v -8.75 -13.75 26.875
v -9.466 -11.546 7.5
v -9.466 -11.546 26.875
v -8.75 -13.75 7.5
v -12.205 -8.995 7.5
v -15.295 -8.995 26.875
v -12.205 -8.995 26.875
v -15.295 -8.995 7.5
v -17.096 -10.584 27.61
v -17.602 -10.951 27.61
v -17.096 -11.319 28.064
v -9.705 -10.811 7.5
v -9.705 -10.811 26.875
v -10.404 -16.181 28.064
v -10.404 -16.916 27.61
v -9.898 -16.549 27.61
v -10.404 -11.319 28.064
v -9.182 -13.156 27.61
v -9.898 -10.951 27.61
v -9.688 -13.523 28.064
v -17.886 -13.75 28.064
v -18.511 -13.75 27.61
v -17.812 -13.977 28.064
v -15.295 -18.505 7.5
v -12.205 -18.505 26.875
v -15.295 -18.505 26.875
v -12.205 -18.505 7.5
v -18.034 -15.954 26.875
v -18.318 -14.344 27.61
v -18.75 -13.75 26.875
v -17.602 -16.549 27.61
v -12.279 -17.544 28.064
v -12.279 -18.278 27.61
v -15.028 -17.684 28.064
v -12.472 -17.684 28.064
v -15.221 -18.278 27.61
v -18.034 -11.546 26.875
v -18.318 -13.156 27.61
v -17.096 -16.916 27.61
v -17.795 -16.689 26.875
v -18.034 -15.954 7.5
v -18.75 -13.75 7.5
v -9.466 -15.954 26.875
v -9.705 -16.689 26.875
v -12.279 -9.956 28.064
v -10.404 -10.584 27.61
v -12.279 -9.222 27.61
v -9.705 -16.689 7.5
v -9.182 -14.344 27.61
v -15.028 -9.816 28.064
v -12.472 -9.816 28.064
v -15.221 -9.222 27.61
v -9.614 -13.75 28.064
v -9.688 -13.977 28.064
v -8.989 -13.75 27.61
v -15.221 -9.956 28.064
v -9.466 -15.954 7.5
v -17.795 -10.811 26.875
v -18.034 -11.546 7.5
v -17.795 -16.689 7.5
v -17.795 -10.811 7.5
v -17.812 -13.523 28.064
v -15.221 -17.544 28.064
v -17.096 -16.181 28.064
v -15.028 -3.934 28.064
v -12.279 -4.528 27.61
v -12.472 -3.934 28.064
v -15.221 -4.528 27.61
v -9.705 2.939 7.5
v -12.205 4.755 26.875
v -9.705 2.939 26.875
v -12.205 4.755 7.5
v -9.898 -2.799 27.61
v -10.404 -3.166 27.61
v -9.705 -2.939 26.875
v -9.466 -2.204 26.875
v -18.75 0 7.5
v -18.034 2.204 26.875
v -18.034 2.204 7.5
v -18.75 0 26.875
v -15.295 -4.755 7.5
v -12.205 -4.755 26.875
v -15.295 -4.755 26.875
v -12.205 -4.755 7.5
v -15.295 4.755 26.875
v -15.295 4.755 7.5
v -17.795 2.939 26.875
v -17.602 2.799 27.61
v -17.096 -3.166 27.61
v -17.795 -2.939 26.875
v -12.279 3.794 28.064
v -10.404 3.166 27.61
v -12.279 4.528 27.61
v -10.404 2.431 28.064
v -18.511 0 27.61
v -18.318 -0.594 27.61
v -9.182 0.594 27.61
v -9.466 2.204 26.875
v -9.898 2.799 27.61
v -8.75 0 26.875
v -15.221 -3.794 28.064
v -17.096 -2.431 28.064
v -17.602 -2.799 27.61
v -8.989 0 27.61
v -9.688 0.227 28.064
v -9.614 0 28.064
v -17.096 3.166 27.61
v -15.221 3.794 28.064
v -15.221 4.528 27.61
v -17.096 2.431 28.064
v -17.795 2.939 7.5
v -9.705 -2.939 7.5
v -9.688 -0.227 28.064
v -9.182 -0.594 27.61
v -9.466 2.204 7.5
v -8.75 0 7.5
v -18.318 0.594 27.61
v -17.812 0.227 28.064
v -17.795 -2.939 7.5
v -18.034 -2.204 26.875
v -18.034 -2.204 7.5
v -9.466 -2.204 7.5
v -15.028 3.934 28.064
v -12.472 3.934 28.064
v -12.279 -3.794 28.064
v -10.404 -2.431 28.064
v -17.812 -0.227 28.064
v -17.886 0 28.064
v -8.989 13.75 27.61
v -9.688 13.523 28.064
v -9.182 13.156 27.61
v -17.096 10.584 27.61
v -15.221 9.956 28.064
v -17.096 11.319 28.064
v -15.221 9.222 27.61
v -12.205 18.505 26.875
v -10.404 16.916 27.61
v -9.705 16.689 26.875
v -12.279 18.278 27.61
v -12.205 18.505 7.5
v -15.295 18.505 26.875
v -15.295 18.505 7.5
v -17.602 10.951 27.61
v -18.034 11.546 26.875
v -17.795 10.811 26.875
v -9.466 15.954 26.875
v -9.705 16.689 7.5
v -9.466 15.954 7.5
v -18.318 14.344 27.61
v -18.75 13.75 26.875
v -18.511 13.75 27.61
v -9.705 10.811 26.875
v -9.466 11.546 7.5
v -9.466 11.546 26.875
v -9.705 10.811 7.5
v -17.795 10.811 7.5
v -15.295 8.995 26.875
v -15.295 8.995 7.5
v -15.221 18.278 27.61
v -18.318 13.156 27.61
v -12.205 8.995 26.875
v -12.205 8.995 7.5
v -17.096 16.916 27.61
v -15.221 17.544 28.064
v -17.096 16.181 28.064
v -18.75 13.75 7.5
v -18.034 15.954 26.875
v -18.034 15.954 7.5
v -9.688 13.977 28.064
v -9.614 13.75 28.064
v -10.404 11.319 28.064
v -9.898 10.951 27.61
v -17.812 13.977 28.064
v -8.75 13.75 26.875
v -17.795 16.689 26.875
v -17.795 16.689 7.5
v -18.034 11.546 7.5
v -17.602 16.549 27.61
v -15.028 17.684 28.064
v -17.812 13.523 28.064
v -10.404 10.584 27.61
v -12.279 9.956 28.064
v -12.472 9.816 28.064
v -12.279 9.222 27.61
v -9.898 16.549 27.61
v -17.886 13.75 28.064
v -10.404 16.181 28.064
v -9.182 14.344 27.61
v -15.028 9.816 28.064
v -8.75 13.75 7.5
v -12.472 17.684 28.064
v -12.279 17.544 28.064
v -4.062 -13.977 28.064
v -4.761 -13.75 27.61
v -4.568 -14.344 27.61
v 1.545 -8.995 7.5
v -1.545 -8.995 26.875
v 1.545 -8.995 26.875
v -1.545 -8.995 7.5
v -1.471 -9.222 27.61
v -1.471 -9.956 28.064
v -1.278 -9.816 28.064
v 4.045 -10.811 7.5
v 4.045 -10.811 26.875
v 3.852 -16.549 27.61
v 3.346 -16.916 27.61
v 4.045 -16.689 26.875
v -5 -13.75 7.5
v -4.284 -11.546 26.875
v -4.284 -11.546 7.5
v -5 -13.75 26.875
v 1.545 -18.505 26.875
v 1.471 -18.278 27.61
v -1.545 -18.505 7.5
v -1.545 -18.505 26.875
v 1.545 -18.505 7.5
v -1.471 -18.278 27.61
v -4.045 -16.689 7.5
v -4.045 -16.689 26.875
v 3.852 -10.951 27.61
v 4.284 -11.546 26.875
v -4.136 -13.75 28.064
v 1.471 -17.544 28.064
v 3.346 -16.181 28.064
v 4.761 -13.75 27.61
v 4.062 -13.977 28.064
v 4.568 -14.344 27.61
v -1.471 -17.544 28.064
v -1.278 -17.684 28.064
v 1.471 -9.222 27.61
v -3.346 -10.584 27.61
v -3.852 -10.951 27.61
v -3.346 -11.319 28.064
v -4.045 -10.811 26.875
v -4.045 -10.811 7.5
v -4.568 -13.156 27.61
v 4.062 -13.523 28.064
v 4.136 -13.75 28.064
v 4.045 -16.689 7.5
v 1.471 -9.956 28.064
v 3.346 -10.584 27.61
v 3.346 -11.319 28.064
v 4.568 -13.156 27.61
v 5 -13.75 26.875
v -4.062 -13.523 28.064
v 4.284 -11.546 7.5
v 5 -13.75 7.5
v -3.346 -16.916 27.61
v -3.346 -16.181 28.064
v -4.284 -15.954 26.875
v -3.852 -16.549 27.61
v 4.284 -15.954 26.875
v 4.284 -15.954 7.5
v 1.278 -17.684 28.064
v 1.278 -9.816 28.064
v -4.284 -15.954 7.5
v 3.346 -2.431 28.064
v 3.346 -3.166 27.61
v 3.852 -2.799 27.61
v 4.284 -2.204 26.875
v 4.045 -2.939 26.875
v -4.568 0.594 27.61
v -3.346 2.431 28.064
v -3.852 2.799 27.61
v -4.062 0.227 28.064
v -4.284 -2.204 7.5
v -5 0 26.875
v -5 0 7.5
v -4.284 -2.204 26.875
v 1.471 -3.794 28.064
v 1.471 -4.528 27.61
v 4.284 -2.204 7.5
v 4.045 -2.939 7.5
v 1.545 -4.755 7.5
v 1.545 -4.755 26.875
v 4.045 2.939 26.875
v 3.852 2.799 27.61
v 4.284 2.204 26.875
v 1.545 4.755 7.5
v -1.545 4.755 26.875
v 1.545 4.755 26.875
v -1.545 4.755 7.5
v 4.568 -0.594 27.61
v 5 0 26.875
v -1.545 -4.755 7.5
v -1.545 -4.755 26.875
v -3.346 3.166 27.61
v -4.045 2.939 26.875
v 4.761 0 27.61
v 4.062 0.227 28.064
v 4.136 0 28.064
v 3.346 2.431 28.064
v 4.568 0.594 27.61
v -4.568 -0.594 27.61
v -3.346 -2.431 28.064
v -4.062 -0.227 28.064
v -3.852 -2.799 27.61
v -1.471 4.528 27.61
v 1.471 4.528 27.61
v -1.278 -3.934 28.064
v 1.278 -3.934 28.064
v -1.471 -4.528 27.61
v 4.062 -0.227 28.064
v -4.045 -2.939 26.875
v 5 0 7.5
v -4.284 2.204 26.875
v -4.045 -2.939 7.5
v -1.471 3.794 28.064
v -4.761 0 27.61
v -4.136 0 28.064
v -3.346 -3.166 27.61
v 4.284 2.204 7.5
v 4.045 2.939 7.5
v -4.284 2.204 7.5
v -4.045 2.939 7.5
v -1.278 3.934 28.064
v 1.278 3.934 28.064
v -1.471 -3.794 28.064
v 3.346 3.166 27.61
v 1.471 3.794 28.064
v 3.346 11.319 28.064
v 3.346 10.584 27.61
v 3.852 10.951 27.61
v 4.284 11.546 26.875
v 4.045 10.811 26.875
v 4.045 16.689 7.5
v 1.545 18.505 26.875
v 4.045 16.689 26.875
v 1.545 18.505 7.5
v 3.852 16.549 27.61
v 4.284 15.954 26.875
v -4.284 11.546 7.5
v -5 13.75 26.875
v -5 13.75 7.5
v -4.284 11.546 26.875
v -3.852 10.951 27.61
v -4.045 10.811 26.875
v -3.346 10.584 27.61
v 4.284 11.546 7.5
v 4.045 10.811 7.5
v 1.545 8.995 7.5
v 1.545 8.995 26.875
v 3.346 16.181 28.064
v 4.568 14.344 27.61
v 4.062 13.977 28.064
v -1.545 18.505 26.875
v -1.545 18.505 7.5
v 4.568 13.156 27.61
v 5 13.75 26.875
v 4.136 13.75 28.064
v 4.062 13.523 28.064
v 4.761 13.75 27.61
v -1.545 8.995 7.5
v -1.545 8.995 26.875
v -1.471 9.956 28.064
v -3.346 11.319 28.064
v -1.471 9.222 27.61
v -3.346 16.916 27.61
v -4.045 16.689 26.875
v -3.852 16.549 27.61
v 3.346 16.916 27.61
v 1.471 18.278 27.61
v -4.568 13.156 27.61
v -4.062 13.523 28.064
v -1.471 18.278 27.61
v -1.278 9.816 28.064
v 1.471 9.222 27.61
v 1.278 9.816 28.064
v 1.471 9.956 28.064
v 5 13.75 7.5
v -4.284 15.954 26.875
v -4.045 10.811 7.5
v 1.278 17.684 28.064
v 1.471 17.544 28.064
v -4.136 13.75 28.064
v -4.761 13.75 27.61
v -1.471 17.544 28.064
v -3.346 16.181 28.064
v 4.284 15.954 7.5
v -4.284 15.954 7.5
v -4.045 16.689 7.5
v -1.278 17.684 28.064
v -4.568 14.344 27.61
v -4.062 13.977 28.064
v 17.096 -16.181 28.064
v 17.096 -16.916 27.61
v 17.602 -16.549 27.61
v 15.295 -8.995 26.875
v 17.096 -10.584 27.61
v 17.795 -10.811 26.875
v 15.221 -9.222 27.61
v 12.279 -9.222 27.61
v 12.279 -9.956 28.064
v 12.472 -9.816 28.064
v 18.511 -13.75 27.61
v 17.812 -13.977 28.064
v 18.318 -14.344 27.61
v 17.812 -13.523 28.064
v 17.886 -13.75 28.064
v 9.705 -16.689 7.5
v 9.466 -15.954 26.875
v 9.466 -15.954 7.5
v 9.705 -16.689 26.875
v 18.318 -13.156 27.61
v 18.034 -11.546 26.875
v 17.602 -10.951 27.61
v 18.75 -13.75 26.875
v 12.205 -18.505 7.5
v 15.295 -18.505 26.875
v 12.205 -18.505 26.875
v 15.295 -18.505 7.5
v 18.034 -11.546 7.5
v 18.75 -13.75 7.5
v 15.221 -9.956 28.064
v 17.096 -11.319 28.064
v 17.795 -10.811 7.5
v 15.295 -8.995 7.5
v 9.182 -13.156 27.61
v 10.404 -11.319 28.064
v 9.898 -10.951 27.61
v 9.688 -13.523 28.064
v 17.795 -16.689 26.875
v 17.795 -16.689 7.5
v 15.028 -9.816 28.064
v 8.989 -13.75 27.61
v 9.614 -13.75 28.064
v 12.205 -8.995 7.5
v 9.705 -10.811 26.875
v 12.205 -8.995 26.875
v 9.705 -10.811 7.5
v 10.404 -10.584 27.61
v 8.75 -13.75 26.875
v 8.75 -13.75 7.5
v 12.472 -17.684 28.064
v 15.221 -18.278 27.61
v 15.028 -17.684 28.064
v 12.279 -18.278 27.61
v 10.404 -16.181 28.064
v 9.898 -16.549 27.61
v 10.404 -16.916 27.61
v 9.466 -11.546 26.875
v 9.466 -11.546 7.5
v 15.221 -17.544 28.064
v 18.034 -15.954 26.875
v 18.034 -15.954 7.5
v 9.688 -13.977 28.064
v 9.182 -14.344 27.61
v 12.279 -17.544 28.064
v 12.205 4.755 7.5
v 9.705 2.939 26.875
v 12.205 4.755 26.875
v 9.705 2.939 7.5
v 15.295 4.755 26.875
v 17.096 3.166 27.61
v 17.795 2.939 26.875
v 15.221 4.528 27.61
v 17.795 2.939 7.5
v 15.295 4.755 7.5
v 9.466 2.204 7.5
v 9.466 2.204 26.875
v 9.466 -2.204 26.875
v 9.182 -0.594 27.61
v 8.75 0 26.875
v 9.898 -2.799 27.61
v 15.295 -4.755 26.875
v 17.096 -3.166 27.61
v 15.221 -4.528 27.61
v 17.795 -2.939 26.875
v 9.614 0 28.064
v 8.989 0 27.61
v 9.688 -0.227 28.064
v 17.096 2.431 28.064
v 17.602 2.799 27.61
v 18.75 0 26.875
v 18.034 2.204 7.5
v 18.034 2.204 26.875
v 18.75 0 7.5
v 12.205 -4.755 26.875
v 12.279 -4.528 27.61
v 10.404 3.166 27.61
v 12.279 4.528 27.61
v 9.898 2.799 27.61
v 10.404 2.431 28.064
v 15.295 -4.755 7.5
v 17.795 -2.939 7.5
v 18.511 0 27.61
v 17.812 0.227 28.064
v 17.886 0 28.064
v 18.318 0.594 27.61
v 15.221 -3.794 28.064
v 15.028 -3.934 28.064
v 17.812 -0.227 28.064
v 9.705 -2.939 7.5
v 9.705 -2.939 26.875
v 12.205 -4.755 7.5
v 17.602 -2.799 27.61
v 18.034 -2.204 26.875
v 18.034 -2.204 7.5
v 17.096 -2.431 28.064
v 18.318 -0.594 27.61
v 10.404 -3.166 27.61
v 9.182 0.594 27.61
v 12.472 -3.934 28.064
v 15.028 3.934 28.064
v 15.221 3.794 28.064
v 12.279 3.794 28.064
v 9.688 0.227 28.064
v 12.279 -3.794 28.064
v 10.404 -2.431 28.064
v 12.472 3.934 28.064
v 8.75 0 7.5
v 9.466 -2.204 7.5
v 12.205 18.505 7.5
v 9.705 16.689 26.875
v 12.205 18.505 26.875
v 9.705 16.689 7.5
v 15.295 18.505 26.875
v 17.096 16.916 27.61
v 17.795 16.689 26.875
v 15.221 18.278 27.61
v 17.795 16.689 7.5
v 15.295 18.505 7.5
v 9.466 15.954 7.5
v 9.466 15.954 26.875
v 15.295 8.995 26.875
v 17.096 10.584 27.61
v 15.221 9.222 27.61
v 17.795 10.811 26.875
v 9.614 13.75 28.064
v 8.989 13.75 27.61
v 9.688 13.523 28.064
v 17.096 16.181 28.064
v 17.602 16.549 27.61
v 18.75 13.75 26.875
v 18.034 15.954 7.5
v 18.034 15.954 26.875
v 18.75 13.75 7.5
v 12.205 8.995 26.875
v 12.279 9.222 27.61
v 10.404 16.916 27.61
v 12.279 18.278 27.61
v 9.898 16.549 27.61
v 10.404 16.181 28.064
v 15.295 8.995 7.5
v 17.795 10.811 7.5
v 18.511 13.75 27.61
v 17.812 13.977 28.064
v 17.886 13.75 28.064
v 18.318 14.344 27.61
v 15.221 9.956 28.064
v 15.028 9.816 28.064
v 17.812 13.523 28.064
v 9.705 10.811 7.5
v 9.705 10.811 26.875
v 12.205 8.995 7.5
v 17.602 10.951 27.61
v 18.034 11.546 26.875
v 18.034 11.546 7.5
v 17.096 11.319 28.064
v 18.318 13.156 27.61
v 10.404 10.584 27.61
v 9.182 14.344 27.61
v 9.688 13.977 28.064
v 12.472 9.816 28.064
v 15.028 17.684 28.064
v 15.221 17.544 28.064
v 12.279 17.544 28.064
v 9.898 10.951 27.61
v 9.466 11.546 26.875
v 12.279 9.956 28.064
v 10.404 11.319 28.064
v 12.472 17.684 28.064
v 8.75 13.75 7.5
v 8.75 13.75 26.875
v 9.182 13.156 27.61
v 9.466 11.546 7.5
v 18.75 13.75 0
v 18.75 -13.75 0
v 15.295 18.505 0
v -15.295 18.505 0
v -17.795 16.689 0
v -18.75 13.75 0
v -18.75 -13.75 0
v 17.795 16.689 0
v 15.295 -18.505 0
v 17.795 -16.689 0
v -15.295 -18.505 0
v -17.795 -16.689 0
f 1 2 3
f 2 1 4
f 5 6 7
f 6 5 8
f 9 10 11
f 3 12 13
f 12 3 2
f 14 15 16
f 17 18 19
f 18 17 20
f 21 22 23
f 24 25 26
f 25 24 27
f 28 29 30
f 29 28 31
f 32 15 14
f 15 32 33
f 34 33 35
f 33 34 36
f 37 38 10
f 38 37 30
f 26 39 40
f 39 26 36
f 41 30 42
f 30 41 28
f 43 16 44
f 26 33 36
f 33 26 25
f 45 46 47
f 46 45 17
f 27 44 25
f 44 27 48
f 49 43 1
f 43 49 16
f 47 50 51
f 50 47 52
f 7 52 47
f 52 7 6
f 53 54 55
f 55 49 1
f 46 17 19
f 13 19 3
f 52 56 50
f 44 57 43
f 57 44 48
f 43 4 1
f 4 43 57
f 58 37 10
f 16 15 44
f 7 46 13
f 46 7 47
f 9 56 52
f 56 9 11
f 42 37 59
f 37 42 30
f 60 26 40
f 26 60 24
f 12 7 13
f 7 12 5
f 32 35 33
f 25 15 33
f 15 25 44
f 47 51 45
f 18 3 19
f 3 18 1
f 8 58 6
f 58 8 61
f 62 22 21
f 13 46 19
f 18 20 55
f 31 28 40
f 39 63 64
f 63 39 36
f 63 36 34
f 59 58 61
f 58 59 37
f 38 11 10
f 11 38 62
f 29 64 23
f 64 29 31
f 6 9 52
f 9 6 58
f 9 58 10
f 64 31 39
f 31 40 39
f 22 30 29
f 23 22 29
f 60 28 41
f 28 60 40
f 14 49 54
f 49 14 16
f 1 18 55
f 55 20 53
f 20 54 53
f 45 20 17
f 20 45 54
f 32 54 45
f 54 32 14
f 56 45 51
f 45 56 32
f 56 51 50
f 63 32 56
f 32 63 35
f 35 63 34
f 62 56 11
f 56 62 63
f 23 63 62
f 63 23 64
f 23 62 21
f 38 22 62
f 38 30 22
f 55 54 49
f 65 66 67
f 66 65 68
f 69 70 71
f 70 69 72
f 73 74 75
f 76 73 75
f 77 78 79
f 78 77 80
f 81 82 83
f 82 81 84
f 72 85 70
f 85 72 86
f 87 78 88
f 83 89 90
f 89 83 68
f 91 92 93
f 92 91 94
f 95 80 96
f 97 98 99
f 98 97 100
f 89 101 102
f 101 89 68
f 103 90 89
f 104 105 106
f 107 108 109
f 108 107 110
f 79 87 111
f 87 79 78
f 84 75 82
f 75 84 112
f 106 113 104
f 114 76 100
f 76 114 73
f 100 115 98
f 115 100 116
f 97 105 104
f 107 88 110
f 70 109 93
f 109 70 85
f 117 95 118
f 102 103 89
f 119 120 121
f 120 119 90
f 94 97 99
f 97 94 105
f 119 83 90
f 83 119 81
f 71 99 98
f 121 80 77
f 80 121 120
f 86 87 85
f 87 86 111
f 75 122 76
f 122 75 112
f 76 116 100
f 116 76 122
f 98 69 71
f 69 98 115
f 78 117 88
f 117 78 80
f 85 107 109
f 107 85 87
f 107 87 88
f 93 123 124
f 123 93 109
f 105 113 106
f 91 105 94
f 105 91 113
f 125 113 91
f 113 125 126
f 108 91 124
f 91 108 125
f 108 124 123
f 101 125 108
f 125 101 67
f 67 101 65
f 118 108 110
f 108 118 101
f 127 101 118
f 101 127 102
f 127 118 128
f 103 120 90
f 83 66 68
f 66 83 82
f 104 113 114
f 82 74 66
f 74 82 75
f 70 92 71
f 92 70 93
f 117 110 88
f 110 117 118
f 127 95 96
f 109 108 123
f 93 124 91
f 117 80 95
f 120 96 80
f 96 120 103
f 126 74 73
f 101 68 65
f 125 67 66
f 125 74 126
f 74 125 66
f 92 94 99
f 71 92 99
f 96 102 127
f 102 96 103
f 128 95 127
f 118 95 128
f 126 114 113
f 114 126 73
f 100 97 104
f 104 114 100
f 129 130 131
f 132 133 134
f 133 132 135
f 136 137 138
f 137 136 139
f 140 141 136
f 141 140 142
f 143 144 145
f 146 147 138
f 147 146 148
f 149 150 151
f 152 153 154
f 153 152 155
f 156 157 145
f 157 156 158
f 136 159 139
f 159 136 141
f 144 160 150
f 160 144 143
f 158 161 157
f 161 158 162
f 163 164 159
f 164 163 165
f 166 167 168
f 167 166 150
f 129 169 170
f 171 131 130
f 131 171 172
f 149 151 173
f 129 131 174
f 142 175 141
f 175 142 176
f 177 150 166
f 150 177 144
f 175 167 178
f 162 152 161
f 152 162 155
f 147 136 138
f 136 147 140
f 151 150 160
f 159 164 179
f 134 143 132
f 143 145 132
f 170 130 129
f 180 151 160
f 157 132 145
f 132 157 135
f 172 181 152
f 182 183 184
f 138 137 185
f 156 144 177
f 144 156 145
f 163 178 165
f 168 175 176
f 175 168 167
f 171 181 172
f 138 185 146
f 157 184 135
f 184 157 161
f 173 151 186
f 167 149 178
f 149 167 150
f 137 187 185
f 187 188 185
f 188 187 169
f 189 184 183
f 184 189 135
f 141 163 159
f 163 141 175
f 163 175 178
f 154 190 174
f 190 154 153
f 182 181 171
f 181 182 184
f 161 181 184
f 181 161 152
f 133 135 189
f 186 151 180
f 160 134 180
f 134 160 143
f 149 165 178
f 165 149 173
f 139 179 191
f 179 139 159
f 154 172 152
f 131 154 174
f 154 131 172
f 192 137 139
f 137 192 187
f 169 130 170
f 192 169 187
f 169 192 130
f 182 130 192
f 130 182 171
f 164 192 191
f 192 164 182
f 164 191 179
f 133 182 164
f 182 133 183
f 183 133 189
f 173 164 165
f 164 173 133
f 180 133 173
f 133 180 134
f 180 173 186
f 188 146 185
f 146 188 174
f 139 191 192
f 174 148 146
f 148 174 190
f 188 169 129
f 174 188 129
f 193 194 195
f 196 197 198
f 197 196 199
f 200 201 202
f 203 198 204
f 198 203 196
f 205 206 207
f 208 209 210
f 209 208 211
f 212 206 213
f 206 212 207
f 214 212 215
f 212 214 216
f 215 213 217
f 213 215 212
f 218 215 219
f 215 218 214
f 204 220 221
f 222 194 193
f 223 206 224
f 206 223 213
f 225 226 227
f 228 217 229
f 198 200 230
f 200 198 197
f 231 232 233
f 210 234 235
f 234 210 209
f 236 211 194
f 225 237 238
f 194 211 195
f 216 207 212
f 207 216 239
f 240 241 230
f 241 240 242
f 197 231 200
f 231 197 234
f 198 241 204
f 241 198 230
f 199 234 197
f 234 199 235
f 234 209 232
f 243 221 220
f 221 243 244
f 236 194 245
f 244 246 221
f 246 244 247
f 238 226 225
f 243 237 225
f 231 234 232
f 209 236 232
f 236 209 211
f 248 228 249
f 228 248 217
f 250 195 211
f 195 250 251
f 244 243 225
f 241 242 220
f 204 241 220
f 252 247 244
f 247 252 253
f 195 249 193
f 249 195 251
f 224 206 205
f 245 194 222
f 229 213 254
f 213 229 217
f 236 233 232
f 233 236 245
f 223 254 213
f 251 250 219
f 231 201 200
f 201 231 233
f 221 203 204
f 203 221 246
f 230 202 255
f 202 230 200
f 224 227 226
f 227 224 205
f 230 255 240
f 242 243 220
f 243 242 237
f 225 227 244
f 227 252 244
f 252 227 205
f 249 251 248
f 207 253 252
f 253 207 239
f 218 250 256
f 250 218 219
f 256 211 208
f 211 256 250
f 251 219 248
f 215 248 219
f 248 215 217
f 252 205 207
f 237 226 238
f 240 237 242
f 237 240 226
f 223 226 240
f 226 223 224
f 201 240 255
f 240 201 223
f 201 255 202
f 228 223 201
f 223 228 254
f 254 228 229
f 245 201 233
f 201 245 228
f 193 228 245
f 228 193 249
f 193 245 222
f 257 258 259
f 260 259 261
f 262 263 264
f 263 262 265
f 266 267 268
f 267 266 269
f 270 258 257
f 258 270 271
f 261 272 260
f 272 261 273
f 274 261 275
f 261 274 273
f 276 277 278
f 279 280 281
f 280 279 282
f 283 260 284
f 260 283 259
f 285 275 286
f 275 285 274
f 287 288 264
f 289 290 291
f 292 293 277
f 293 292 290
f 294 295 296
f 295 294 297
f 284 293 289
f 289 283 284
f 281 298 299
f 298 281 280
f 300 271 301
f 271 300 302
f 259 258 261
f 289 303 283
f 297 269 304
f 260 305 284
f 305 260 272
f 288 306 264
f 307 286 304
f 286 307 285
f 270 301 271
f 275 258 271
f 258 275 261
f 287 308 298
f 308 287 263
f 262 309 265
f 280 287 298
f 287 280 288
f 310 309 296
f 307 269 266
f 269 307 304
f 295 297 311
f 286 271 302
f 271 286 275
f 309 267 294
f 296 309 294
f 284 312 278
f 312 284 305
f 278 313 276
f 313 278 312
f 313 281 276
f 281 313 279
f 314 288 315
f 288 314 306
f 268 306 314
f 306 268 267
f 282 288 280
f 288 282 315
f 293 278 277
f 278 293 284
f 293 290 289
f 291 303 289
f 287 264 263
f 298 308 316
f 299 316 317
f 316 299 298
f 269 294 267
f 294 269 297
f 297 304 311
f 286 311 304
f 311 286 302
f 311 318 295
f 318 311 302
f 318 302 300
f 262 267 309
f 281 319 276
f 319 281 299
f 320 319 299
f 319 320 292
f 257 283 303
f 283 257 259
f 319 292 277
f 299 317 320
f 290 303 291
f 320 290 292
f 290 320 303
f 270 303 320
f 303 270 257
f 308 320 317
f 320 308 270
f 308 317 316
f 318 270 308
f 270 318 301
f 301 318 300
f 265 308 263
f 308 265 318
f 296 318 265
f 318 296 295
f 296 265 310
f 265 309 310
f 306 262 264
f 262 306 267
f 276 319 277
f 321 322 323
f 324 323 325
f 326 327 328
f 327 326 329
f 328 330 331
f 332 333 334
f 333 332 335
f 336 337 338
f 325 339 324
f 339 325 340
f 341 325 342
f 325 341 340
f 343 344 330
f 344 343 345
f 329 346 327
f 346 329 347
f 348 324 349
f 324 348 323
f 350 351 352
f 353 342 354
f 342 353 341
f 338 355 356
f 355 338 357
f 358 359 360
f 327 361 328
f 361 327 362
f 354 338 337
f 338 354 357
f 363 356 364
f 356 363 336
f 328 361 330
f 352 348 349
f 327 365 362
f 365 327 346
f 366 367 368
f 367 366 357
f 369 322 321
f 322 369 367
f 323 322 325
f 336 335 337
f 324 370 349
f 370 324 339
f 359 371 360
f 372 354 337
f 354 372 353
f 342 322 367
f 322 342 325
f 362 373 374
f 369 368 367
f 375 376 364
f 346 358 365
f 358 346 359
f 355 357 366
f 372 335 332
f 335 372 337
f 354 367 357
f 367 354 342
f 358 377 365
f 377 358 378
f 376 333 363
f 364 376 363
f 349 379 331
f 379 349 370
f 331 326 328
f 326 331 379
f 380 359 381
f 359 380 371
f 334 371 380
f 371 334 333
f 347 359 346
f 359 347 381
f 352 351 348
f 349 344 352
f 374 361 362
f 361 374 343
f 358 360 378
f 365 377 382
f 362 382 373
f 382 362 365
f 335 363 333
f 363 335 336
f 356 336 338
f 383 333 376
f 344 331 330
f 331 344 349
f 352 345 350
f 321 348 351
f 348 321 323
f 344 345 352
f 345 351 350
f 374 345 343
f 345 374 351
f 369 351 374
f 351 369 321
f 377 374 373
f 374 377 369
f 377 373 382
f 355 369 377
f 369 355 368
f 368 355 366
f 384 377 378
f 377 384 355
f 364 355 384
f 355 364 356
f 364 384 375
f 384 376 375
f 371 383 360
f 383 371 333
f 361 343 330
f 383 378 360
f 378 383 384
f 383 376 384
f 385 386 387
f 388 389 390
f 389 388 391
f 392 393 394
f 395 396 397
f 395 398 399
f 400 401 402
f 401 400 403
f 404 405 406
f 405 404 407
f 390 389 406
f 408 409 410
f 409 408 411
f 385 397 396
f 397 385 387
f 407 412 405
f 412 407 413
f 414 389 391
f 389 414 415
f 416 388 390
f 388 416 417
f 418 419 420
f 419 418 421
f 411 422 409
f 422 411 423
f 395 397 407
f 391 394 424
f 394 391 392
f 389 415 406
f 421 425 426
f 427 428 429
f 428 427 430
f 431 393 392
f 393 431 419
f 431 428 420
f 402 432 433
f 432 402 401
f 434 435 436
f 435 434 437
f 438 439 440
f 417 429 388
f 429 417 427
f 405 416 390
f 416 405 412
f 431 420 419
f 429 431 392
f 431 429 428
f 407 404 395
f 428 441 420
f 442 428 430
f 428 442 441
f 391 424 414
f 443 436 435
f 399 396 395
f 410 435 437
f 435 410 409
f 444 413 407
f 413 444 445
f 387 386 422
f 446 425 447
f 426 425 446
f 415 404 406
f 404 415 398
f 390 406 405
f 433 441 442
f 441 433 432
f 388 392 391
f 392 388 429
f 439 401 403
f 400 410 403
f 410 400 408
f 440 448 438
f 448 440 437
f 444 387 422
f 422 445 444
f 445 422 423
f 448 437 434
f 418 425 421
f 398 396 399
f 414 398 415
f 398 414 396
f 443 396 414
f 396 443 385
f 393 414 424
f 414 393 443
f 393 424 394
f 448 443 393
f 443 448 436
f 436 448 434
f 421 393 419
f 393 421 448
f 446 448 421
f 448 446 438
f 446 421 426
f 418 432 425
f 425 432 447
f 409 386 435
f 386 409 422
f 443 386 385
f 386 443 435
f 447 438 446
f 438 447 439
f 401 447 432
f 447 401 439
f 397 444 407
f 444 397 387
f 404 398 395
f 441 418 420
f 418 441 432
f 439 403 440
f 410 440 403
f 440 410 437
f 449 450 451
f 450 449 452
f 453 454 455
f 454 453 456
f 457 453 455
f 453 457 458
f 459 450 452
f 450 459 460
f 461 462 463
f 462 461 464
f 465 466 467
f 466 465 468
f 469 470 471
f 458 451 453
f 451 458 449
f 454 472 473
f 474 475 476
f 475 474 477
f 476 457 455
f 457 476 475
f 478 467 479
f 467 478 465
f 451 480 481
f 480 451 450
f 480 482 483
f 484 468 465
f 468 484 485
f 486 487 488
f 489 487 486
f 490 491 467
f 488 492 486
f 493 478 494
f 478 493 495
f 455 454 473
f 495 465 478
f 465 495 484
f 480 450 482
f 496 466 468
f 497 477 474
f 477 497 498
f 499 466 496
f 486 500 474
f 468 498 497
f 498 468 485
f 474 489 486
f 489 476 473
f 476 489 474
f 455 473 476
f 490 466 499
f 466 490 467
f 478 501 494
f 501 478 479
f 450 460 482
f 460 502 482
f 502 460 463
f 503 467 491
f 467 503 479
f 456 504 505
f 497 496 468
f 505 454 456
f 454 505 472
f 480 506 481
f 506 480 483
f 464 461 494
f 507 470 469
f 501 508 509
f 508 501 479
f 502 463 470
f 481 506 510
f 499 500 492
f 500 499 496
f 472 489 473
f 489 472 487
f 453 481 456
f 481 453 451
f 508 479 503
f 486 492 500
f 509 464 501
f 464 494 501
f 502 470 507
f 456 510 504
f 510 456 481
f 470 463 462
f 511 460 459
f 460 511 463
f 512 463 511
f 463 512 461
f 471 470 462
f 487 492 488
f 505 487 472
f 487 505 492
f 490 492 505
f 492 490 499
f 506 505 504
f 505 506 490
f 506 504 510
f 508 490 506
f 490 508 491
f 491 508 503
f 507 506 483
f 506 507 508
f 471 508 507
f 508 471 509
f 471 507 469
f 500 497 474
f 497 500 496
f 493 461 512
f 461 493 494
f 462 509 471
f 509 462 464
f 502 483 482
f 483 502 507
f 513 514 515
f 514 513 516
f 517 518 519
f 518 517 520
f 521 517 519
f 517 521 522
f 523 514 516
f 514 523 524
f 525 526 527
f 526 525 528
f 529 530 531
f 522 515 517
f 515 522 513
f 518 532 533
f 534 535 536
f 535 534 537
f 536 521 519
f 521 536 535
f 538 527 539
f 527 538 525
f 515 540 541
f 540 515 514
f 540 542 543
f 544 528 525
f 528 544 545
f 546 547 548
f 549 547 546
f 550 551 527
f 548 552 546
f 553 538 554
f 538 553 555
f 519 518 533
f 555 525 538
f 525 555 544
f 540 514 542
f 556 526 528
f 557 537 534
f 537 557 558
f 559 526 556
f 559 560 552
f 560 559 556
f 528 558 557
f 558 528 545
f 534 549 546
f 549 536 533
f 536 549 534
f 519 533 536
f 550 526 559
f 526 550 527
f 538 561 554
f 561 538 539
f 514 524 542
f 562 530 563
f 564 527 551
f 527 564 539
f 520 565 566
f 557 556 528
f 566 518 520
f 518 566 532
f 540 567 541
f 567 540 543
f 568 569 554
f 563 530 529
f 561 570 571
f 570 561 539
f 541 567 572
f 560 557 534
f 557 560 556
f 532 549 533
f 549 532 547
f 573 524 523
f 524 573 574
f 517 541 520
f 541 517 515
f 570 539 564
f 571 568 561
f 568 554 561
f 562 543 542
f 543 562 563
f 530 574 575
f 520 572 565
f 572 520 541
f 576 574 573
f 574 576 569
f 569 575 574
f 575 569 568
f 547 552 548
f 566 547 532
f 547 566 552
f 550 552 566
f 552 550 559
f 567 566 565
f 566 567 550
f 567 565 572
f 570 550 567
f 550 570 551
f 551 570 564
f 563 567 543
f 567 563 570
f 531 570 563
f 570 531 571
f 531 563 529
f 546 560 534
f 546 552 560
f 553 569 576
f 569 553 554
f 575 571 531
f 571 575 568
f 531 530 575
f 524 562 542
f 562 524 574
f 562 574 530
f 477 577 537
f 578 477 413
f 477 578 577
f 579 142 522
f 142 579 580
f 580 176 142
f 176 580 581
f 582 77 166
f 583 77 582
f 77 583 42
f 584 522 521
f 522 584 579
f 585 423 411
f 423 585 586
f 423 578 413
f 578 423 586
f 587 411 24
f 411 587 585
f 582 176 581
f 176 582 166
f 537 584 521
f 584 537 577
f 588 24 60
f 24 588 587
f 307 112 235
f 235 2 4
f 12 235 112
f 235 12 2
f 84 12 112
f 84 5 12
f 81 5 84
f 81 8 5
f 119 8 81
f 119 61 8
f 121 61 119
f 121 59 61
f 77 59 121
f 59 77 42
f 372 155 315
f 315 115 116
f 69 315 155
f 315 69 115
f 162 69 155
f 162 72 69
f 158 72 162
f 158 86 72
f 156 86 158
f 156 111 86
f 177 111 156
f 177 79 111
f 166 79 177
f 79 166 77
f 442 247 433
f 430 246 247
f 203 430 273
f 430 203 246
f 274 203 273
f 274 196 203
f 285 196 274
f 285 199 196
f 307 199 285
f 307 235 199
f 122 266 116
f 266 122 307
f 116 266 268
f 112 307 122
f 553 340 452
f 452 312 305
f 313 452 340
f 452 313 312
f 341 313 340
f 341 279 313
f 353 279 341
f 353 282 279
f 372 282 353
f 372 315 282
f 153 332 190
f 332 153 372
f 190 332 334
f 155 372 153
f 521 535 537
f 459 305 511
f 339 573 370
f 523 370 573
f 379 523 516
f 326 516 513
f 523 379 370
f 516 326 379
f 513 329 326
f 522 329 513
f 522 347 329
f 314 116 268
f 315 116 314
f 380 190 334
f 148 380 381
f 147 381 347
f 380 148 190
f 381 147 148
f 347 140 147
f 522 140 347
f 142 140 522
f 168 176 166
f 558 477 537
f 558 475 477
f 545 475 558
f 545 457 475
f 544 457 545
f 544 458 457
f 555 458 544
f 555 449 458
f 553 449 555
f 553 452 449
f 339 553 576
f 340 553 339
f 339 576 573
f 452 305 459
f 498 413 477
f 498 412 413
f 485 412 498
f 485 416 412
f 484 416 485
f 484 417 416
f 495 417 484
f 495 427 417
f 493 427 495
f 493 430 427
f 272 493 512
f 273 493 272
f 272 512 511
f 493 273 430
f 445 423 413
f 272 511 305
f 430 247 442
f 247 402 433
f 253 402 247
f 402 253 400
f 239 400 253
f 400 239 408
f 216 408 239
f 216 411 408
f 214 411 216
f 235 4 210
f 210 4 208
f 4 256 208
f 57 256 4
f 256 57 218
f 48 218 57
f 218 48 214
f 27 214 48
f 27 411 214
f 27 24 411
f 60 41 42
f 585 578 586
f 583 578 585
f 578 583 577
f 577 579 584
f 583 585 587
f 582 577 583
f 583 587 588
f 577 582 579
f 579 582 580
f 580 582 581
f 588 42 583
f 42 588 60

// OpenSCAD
//rc = true; 
rc = false;

extra_fine = false;

$fn = rc ? (extra_fine ? 200 : 100) : 10;


posts = 3;
post_width = 10;

post_gap = post_width / 2;

base_base_width = post_width + (post_gap / 2);
//base_width = 25;
base_width = base_base_width * posts;

base_height = base_width / 5; 

post_height = base_width * (3/4);


corner_rounding = post_width / 4;

gap = (base_width - (posts * post_width)) / (posts - 1);


module base() {
    color("red") hull() {
        for(x = [0:(posts - 1)]) {
            for(y = [0:(posts - 1)]) {
                translate([x * (post_width + gap), y * (post_width + gap), 0]) {
                    cylinder(d = post_width, h = base_height);
                }
            }
        }
    }
}




module towers() {
    //color("purple") cube([15,15,post_height]);
    for(x = [0:(posts - 1)]) {
        for(y = [0:(posts - 1)]) {
            color("blue") minkowski() {
                translate([x * (post_width + gap), y * (post_width + gap), corner_rounding / 2]) {
                    cylinder(d = post_width - corner_rounding, h = post_height - corner_rounding);
                }
                sphere(d = corner_rounding);
            }
        }
    }
}




module yardstick() {
    translate([-corner_rounding*2, -corner_rounding*2, 10]) {
        color("purple") cube([base_width, base_width, 10]);
    }
}


translate([(corner_rounding * 2) - (base_width / 2), (corner_rounding * 2) - (base_width / 2), 0]) {
    base();
    towers();

    //yardstick();
}
